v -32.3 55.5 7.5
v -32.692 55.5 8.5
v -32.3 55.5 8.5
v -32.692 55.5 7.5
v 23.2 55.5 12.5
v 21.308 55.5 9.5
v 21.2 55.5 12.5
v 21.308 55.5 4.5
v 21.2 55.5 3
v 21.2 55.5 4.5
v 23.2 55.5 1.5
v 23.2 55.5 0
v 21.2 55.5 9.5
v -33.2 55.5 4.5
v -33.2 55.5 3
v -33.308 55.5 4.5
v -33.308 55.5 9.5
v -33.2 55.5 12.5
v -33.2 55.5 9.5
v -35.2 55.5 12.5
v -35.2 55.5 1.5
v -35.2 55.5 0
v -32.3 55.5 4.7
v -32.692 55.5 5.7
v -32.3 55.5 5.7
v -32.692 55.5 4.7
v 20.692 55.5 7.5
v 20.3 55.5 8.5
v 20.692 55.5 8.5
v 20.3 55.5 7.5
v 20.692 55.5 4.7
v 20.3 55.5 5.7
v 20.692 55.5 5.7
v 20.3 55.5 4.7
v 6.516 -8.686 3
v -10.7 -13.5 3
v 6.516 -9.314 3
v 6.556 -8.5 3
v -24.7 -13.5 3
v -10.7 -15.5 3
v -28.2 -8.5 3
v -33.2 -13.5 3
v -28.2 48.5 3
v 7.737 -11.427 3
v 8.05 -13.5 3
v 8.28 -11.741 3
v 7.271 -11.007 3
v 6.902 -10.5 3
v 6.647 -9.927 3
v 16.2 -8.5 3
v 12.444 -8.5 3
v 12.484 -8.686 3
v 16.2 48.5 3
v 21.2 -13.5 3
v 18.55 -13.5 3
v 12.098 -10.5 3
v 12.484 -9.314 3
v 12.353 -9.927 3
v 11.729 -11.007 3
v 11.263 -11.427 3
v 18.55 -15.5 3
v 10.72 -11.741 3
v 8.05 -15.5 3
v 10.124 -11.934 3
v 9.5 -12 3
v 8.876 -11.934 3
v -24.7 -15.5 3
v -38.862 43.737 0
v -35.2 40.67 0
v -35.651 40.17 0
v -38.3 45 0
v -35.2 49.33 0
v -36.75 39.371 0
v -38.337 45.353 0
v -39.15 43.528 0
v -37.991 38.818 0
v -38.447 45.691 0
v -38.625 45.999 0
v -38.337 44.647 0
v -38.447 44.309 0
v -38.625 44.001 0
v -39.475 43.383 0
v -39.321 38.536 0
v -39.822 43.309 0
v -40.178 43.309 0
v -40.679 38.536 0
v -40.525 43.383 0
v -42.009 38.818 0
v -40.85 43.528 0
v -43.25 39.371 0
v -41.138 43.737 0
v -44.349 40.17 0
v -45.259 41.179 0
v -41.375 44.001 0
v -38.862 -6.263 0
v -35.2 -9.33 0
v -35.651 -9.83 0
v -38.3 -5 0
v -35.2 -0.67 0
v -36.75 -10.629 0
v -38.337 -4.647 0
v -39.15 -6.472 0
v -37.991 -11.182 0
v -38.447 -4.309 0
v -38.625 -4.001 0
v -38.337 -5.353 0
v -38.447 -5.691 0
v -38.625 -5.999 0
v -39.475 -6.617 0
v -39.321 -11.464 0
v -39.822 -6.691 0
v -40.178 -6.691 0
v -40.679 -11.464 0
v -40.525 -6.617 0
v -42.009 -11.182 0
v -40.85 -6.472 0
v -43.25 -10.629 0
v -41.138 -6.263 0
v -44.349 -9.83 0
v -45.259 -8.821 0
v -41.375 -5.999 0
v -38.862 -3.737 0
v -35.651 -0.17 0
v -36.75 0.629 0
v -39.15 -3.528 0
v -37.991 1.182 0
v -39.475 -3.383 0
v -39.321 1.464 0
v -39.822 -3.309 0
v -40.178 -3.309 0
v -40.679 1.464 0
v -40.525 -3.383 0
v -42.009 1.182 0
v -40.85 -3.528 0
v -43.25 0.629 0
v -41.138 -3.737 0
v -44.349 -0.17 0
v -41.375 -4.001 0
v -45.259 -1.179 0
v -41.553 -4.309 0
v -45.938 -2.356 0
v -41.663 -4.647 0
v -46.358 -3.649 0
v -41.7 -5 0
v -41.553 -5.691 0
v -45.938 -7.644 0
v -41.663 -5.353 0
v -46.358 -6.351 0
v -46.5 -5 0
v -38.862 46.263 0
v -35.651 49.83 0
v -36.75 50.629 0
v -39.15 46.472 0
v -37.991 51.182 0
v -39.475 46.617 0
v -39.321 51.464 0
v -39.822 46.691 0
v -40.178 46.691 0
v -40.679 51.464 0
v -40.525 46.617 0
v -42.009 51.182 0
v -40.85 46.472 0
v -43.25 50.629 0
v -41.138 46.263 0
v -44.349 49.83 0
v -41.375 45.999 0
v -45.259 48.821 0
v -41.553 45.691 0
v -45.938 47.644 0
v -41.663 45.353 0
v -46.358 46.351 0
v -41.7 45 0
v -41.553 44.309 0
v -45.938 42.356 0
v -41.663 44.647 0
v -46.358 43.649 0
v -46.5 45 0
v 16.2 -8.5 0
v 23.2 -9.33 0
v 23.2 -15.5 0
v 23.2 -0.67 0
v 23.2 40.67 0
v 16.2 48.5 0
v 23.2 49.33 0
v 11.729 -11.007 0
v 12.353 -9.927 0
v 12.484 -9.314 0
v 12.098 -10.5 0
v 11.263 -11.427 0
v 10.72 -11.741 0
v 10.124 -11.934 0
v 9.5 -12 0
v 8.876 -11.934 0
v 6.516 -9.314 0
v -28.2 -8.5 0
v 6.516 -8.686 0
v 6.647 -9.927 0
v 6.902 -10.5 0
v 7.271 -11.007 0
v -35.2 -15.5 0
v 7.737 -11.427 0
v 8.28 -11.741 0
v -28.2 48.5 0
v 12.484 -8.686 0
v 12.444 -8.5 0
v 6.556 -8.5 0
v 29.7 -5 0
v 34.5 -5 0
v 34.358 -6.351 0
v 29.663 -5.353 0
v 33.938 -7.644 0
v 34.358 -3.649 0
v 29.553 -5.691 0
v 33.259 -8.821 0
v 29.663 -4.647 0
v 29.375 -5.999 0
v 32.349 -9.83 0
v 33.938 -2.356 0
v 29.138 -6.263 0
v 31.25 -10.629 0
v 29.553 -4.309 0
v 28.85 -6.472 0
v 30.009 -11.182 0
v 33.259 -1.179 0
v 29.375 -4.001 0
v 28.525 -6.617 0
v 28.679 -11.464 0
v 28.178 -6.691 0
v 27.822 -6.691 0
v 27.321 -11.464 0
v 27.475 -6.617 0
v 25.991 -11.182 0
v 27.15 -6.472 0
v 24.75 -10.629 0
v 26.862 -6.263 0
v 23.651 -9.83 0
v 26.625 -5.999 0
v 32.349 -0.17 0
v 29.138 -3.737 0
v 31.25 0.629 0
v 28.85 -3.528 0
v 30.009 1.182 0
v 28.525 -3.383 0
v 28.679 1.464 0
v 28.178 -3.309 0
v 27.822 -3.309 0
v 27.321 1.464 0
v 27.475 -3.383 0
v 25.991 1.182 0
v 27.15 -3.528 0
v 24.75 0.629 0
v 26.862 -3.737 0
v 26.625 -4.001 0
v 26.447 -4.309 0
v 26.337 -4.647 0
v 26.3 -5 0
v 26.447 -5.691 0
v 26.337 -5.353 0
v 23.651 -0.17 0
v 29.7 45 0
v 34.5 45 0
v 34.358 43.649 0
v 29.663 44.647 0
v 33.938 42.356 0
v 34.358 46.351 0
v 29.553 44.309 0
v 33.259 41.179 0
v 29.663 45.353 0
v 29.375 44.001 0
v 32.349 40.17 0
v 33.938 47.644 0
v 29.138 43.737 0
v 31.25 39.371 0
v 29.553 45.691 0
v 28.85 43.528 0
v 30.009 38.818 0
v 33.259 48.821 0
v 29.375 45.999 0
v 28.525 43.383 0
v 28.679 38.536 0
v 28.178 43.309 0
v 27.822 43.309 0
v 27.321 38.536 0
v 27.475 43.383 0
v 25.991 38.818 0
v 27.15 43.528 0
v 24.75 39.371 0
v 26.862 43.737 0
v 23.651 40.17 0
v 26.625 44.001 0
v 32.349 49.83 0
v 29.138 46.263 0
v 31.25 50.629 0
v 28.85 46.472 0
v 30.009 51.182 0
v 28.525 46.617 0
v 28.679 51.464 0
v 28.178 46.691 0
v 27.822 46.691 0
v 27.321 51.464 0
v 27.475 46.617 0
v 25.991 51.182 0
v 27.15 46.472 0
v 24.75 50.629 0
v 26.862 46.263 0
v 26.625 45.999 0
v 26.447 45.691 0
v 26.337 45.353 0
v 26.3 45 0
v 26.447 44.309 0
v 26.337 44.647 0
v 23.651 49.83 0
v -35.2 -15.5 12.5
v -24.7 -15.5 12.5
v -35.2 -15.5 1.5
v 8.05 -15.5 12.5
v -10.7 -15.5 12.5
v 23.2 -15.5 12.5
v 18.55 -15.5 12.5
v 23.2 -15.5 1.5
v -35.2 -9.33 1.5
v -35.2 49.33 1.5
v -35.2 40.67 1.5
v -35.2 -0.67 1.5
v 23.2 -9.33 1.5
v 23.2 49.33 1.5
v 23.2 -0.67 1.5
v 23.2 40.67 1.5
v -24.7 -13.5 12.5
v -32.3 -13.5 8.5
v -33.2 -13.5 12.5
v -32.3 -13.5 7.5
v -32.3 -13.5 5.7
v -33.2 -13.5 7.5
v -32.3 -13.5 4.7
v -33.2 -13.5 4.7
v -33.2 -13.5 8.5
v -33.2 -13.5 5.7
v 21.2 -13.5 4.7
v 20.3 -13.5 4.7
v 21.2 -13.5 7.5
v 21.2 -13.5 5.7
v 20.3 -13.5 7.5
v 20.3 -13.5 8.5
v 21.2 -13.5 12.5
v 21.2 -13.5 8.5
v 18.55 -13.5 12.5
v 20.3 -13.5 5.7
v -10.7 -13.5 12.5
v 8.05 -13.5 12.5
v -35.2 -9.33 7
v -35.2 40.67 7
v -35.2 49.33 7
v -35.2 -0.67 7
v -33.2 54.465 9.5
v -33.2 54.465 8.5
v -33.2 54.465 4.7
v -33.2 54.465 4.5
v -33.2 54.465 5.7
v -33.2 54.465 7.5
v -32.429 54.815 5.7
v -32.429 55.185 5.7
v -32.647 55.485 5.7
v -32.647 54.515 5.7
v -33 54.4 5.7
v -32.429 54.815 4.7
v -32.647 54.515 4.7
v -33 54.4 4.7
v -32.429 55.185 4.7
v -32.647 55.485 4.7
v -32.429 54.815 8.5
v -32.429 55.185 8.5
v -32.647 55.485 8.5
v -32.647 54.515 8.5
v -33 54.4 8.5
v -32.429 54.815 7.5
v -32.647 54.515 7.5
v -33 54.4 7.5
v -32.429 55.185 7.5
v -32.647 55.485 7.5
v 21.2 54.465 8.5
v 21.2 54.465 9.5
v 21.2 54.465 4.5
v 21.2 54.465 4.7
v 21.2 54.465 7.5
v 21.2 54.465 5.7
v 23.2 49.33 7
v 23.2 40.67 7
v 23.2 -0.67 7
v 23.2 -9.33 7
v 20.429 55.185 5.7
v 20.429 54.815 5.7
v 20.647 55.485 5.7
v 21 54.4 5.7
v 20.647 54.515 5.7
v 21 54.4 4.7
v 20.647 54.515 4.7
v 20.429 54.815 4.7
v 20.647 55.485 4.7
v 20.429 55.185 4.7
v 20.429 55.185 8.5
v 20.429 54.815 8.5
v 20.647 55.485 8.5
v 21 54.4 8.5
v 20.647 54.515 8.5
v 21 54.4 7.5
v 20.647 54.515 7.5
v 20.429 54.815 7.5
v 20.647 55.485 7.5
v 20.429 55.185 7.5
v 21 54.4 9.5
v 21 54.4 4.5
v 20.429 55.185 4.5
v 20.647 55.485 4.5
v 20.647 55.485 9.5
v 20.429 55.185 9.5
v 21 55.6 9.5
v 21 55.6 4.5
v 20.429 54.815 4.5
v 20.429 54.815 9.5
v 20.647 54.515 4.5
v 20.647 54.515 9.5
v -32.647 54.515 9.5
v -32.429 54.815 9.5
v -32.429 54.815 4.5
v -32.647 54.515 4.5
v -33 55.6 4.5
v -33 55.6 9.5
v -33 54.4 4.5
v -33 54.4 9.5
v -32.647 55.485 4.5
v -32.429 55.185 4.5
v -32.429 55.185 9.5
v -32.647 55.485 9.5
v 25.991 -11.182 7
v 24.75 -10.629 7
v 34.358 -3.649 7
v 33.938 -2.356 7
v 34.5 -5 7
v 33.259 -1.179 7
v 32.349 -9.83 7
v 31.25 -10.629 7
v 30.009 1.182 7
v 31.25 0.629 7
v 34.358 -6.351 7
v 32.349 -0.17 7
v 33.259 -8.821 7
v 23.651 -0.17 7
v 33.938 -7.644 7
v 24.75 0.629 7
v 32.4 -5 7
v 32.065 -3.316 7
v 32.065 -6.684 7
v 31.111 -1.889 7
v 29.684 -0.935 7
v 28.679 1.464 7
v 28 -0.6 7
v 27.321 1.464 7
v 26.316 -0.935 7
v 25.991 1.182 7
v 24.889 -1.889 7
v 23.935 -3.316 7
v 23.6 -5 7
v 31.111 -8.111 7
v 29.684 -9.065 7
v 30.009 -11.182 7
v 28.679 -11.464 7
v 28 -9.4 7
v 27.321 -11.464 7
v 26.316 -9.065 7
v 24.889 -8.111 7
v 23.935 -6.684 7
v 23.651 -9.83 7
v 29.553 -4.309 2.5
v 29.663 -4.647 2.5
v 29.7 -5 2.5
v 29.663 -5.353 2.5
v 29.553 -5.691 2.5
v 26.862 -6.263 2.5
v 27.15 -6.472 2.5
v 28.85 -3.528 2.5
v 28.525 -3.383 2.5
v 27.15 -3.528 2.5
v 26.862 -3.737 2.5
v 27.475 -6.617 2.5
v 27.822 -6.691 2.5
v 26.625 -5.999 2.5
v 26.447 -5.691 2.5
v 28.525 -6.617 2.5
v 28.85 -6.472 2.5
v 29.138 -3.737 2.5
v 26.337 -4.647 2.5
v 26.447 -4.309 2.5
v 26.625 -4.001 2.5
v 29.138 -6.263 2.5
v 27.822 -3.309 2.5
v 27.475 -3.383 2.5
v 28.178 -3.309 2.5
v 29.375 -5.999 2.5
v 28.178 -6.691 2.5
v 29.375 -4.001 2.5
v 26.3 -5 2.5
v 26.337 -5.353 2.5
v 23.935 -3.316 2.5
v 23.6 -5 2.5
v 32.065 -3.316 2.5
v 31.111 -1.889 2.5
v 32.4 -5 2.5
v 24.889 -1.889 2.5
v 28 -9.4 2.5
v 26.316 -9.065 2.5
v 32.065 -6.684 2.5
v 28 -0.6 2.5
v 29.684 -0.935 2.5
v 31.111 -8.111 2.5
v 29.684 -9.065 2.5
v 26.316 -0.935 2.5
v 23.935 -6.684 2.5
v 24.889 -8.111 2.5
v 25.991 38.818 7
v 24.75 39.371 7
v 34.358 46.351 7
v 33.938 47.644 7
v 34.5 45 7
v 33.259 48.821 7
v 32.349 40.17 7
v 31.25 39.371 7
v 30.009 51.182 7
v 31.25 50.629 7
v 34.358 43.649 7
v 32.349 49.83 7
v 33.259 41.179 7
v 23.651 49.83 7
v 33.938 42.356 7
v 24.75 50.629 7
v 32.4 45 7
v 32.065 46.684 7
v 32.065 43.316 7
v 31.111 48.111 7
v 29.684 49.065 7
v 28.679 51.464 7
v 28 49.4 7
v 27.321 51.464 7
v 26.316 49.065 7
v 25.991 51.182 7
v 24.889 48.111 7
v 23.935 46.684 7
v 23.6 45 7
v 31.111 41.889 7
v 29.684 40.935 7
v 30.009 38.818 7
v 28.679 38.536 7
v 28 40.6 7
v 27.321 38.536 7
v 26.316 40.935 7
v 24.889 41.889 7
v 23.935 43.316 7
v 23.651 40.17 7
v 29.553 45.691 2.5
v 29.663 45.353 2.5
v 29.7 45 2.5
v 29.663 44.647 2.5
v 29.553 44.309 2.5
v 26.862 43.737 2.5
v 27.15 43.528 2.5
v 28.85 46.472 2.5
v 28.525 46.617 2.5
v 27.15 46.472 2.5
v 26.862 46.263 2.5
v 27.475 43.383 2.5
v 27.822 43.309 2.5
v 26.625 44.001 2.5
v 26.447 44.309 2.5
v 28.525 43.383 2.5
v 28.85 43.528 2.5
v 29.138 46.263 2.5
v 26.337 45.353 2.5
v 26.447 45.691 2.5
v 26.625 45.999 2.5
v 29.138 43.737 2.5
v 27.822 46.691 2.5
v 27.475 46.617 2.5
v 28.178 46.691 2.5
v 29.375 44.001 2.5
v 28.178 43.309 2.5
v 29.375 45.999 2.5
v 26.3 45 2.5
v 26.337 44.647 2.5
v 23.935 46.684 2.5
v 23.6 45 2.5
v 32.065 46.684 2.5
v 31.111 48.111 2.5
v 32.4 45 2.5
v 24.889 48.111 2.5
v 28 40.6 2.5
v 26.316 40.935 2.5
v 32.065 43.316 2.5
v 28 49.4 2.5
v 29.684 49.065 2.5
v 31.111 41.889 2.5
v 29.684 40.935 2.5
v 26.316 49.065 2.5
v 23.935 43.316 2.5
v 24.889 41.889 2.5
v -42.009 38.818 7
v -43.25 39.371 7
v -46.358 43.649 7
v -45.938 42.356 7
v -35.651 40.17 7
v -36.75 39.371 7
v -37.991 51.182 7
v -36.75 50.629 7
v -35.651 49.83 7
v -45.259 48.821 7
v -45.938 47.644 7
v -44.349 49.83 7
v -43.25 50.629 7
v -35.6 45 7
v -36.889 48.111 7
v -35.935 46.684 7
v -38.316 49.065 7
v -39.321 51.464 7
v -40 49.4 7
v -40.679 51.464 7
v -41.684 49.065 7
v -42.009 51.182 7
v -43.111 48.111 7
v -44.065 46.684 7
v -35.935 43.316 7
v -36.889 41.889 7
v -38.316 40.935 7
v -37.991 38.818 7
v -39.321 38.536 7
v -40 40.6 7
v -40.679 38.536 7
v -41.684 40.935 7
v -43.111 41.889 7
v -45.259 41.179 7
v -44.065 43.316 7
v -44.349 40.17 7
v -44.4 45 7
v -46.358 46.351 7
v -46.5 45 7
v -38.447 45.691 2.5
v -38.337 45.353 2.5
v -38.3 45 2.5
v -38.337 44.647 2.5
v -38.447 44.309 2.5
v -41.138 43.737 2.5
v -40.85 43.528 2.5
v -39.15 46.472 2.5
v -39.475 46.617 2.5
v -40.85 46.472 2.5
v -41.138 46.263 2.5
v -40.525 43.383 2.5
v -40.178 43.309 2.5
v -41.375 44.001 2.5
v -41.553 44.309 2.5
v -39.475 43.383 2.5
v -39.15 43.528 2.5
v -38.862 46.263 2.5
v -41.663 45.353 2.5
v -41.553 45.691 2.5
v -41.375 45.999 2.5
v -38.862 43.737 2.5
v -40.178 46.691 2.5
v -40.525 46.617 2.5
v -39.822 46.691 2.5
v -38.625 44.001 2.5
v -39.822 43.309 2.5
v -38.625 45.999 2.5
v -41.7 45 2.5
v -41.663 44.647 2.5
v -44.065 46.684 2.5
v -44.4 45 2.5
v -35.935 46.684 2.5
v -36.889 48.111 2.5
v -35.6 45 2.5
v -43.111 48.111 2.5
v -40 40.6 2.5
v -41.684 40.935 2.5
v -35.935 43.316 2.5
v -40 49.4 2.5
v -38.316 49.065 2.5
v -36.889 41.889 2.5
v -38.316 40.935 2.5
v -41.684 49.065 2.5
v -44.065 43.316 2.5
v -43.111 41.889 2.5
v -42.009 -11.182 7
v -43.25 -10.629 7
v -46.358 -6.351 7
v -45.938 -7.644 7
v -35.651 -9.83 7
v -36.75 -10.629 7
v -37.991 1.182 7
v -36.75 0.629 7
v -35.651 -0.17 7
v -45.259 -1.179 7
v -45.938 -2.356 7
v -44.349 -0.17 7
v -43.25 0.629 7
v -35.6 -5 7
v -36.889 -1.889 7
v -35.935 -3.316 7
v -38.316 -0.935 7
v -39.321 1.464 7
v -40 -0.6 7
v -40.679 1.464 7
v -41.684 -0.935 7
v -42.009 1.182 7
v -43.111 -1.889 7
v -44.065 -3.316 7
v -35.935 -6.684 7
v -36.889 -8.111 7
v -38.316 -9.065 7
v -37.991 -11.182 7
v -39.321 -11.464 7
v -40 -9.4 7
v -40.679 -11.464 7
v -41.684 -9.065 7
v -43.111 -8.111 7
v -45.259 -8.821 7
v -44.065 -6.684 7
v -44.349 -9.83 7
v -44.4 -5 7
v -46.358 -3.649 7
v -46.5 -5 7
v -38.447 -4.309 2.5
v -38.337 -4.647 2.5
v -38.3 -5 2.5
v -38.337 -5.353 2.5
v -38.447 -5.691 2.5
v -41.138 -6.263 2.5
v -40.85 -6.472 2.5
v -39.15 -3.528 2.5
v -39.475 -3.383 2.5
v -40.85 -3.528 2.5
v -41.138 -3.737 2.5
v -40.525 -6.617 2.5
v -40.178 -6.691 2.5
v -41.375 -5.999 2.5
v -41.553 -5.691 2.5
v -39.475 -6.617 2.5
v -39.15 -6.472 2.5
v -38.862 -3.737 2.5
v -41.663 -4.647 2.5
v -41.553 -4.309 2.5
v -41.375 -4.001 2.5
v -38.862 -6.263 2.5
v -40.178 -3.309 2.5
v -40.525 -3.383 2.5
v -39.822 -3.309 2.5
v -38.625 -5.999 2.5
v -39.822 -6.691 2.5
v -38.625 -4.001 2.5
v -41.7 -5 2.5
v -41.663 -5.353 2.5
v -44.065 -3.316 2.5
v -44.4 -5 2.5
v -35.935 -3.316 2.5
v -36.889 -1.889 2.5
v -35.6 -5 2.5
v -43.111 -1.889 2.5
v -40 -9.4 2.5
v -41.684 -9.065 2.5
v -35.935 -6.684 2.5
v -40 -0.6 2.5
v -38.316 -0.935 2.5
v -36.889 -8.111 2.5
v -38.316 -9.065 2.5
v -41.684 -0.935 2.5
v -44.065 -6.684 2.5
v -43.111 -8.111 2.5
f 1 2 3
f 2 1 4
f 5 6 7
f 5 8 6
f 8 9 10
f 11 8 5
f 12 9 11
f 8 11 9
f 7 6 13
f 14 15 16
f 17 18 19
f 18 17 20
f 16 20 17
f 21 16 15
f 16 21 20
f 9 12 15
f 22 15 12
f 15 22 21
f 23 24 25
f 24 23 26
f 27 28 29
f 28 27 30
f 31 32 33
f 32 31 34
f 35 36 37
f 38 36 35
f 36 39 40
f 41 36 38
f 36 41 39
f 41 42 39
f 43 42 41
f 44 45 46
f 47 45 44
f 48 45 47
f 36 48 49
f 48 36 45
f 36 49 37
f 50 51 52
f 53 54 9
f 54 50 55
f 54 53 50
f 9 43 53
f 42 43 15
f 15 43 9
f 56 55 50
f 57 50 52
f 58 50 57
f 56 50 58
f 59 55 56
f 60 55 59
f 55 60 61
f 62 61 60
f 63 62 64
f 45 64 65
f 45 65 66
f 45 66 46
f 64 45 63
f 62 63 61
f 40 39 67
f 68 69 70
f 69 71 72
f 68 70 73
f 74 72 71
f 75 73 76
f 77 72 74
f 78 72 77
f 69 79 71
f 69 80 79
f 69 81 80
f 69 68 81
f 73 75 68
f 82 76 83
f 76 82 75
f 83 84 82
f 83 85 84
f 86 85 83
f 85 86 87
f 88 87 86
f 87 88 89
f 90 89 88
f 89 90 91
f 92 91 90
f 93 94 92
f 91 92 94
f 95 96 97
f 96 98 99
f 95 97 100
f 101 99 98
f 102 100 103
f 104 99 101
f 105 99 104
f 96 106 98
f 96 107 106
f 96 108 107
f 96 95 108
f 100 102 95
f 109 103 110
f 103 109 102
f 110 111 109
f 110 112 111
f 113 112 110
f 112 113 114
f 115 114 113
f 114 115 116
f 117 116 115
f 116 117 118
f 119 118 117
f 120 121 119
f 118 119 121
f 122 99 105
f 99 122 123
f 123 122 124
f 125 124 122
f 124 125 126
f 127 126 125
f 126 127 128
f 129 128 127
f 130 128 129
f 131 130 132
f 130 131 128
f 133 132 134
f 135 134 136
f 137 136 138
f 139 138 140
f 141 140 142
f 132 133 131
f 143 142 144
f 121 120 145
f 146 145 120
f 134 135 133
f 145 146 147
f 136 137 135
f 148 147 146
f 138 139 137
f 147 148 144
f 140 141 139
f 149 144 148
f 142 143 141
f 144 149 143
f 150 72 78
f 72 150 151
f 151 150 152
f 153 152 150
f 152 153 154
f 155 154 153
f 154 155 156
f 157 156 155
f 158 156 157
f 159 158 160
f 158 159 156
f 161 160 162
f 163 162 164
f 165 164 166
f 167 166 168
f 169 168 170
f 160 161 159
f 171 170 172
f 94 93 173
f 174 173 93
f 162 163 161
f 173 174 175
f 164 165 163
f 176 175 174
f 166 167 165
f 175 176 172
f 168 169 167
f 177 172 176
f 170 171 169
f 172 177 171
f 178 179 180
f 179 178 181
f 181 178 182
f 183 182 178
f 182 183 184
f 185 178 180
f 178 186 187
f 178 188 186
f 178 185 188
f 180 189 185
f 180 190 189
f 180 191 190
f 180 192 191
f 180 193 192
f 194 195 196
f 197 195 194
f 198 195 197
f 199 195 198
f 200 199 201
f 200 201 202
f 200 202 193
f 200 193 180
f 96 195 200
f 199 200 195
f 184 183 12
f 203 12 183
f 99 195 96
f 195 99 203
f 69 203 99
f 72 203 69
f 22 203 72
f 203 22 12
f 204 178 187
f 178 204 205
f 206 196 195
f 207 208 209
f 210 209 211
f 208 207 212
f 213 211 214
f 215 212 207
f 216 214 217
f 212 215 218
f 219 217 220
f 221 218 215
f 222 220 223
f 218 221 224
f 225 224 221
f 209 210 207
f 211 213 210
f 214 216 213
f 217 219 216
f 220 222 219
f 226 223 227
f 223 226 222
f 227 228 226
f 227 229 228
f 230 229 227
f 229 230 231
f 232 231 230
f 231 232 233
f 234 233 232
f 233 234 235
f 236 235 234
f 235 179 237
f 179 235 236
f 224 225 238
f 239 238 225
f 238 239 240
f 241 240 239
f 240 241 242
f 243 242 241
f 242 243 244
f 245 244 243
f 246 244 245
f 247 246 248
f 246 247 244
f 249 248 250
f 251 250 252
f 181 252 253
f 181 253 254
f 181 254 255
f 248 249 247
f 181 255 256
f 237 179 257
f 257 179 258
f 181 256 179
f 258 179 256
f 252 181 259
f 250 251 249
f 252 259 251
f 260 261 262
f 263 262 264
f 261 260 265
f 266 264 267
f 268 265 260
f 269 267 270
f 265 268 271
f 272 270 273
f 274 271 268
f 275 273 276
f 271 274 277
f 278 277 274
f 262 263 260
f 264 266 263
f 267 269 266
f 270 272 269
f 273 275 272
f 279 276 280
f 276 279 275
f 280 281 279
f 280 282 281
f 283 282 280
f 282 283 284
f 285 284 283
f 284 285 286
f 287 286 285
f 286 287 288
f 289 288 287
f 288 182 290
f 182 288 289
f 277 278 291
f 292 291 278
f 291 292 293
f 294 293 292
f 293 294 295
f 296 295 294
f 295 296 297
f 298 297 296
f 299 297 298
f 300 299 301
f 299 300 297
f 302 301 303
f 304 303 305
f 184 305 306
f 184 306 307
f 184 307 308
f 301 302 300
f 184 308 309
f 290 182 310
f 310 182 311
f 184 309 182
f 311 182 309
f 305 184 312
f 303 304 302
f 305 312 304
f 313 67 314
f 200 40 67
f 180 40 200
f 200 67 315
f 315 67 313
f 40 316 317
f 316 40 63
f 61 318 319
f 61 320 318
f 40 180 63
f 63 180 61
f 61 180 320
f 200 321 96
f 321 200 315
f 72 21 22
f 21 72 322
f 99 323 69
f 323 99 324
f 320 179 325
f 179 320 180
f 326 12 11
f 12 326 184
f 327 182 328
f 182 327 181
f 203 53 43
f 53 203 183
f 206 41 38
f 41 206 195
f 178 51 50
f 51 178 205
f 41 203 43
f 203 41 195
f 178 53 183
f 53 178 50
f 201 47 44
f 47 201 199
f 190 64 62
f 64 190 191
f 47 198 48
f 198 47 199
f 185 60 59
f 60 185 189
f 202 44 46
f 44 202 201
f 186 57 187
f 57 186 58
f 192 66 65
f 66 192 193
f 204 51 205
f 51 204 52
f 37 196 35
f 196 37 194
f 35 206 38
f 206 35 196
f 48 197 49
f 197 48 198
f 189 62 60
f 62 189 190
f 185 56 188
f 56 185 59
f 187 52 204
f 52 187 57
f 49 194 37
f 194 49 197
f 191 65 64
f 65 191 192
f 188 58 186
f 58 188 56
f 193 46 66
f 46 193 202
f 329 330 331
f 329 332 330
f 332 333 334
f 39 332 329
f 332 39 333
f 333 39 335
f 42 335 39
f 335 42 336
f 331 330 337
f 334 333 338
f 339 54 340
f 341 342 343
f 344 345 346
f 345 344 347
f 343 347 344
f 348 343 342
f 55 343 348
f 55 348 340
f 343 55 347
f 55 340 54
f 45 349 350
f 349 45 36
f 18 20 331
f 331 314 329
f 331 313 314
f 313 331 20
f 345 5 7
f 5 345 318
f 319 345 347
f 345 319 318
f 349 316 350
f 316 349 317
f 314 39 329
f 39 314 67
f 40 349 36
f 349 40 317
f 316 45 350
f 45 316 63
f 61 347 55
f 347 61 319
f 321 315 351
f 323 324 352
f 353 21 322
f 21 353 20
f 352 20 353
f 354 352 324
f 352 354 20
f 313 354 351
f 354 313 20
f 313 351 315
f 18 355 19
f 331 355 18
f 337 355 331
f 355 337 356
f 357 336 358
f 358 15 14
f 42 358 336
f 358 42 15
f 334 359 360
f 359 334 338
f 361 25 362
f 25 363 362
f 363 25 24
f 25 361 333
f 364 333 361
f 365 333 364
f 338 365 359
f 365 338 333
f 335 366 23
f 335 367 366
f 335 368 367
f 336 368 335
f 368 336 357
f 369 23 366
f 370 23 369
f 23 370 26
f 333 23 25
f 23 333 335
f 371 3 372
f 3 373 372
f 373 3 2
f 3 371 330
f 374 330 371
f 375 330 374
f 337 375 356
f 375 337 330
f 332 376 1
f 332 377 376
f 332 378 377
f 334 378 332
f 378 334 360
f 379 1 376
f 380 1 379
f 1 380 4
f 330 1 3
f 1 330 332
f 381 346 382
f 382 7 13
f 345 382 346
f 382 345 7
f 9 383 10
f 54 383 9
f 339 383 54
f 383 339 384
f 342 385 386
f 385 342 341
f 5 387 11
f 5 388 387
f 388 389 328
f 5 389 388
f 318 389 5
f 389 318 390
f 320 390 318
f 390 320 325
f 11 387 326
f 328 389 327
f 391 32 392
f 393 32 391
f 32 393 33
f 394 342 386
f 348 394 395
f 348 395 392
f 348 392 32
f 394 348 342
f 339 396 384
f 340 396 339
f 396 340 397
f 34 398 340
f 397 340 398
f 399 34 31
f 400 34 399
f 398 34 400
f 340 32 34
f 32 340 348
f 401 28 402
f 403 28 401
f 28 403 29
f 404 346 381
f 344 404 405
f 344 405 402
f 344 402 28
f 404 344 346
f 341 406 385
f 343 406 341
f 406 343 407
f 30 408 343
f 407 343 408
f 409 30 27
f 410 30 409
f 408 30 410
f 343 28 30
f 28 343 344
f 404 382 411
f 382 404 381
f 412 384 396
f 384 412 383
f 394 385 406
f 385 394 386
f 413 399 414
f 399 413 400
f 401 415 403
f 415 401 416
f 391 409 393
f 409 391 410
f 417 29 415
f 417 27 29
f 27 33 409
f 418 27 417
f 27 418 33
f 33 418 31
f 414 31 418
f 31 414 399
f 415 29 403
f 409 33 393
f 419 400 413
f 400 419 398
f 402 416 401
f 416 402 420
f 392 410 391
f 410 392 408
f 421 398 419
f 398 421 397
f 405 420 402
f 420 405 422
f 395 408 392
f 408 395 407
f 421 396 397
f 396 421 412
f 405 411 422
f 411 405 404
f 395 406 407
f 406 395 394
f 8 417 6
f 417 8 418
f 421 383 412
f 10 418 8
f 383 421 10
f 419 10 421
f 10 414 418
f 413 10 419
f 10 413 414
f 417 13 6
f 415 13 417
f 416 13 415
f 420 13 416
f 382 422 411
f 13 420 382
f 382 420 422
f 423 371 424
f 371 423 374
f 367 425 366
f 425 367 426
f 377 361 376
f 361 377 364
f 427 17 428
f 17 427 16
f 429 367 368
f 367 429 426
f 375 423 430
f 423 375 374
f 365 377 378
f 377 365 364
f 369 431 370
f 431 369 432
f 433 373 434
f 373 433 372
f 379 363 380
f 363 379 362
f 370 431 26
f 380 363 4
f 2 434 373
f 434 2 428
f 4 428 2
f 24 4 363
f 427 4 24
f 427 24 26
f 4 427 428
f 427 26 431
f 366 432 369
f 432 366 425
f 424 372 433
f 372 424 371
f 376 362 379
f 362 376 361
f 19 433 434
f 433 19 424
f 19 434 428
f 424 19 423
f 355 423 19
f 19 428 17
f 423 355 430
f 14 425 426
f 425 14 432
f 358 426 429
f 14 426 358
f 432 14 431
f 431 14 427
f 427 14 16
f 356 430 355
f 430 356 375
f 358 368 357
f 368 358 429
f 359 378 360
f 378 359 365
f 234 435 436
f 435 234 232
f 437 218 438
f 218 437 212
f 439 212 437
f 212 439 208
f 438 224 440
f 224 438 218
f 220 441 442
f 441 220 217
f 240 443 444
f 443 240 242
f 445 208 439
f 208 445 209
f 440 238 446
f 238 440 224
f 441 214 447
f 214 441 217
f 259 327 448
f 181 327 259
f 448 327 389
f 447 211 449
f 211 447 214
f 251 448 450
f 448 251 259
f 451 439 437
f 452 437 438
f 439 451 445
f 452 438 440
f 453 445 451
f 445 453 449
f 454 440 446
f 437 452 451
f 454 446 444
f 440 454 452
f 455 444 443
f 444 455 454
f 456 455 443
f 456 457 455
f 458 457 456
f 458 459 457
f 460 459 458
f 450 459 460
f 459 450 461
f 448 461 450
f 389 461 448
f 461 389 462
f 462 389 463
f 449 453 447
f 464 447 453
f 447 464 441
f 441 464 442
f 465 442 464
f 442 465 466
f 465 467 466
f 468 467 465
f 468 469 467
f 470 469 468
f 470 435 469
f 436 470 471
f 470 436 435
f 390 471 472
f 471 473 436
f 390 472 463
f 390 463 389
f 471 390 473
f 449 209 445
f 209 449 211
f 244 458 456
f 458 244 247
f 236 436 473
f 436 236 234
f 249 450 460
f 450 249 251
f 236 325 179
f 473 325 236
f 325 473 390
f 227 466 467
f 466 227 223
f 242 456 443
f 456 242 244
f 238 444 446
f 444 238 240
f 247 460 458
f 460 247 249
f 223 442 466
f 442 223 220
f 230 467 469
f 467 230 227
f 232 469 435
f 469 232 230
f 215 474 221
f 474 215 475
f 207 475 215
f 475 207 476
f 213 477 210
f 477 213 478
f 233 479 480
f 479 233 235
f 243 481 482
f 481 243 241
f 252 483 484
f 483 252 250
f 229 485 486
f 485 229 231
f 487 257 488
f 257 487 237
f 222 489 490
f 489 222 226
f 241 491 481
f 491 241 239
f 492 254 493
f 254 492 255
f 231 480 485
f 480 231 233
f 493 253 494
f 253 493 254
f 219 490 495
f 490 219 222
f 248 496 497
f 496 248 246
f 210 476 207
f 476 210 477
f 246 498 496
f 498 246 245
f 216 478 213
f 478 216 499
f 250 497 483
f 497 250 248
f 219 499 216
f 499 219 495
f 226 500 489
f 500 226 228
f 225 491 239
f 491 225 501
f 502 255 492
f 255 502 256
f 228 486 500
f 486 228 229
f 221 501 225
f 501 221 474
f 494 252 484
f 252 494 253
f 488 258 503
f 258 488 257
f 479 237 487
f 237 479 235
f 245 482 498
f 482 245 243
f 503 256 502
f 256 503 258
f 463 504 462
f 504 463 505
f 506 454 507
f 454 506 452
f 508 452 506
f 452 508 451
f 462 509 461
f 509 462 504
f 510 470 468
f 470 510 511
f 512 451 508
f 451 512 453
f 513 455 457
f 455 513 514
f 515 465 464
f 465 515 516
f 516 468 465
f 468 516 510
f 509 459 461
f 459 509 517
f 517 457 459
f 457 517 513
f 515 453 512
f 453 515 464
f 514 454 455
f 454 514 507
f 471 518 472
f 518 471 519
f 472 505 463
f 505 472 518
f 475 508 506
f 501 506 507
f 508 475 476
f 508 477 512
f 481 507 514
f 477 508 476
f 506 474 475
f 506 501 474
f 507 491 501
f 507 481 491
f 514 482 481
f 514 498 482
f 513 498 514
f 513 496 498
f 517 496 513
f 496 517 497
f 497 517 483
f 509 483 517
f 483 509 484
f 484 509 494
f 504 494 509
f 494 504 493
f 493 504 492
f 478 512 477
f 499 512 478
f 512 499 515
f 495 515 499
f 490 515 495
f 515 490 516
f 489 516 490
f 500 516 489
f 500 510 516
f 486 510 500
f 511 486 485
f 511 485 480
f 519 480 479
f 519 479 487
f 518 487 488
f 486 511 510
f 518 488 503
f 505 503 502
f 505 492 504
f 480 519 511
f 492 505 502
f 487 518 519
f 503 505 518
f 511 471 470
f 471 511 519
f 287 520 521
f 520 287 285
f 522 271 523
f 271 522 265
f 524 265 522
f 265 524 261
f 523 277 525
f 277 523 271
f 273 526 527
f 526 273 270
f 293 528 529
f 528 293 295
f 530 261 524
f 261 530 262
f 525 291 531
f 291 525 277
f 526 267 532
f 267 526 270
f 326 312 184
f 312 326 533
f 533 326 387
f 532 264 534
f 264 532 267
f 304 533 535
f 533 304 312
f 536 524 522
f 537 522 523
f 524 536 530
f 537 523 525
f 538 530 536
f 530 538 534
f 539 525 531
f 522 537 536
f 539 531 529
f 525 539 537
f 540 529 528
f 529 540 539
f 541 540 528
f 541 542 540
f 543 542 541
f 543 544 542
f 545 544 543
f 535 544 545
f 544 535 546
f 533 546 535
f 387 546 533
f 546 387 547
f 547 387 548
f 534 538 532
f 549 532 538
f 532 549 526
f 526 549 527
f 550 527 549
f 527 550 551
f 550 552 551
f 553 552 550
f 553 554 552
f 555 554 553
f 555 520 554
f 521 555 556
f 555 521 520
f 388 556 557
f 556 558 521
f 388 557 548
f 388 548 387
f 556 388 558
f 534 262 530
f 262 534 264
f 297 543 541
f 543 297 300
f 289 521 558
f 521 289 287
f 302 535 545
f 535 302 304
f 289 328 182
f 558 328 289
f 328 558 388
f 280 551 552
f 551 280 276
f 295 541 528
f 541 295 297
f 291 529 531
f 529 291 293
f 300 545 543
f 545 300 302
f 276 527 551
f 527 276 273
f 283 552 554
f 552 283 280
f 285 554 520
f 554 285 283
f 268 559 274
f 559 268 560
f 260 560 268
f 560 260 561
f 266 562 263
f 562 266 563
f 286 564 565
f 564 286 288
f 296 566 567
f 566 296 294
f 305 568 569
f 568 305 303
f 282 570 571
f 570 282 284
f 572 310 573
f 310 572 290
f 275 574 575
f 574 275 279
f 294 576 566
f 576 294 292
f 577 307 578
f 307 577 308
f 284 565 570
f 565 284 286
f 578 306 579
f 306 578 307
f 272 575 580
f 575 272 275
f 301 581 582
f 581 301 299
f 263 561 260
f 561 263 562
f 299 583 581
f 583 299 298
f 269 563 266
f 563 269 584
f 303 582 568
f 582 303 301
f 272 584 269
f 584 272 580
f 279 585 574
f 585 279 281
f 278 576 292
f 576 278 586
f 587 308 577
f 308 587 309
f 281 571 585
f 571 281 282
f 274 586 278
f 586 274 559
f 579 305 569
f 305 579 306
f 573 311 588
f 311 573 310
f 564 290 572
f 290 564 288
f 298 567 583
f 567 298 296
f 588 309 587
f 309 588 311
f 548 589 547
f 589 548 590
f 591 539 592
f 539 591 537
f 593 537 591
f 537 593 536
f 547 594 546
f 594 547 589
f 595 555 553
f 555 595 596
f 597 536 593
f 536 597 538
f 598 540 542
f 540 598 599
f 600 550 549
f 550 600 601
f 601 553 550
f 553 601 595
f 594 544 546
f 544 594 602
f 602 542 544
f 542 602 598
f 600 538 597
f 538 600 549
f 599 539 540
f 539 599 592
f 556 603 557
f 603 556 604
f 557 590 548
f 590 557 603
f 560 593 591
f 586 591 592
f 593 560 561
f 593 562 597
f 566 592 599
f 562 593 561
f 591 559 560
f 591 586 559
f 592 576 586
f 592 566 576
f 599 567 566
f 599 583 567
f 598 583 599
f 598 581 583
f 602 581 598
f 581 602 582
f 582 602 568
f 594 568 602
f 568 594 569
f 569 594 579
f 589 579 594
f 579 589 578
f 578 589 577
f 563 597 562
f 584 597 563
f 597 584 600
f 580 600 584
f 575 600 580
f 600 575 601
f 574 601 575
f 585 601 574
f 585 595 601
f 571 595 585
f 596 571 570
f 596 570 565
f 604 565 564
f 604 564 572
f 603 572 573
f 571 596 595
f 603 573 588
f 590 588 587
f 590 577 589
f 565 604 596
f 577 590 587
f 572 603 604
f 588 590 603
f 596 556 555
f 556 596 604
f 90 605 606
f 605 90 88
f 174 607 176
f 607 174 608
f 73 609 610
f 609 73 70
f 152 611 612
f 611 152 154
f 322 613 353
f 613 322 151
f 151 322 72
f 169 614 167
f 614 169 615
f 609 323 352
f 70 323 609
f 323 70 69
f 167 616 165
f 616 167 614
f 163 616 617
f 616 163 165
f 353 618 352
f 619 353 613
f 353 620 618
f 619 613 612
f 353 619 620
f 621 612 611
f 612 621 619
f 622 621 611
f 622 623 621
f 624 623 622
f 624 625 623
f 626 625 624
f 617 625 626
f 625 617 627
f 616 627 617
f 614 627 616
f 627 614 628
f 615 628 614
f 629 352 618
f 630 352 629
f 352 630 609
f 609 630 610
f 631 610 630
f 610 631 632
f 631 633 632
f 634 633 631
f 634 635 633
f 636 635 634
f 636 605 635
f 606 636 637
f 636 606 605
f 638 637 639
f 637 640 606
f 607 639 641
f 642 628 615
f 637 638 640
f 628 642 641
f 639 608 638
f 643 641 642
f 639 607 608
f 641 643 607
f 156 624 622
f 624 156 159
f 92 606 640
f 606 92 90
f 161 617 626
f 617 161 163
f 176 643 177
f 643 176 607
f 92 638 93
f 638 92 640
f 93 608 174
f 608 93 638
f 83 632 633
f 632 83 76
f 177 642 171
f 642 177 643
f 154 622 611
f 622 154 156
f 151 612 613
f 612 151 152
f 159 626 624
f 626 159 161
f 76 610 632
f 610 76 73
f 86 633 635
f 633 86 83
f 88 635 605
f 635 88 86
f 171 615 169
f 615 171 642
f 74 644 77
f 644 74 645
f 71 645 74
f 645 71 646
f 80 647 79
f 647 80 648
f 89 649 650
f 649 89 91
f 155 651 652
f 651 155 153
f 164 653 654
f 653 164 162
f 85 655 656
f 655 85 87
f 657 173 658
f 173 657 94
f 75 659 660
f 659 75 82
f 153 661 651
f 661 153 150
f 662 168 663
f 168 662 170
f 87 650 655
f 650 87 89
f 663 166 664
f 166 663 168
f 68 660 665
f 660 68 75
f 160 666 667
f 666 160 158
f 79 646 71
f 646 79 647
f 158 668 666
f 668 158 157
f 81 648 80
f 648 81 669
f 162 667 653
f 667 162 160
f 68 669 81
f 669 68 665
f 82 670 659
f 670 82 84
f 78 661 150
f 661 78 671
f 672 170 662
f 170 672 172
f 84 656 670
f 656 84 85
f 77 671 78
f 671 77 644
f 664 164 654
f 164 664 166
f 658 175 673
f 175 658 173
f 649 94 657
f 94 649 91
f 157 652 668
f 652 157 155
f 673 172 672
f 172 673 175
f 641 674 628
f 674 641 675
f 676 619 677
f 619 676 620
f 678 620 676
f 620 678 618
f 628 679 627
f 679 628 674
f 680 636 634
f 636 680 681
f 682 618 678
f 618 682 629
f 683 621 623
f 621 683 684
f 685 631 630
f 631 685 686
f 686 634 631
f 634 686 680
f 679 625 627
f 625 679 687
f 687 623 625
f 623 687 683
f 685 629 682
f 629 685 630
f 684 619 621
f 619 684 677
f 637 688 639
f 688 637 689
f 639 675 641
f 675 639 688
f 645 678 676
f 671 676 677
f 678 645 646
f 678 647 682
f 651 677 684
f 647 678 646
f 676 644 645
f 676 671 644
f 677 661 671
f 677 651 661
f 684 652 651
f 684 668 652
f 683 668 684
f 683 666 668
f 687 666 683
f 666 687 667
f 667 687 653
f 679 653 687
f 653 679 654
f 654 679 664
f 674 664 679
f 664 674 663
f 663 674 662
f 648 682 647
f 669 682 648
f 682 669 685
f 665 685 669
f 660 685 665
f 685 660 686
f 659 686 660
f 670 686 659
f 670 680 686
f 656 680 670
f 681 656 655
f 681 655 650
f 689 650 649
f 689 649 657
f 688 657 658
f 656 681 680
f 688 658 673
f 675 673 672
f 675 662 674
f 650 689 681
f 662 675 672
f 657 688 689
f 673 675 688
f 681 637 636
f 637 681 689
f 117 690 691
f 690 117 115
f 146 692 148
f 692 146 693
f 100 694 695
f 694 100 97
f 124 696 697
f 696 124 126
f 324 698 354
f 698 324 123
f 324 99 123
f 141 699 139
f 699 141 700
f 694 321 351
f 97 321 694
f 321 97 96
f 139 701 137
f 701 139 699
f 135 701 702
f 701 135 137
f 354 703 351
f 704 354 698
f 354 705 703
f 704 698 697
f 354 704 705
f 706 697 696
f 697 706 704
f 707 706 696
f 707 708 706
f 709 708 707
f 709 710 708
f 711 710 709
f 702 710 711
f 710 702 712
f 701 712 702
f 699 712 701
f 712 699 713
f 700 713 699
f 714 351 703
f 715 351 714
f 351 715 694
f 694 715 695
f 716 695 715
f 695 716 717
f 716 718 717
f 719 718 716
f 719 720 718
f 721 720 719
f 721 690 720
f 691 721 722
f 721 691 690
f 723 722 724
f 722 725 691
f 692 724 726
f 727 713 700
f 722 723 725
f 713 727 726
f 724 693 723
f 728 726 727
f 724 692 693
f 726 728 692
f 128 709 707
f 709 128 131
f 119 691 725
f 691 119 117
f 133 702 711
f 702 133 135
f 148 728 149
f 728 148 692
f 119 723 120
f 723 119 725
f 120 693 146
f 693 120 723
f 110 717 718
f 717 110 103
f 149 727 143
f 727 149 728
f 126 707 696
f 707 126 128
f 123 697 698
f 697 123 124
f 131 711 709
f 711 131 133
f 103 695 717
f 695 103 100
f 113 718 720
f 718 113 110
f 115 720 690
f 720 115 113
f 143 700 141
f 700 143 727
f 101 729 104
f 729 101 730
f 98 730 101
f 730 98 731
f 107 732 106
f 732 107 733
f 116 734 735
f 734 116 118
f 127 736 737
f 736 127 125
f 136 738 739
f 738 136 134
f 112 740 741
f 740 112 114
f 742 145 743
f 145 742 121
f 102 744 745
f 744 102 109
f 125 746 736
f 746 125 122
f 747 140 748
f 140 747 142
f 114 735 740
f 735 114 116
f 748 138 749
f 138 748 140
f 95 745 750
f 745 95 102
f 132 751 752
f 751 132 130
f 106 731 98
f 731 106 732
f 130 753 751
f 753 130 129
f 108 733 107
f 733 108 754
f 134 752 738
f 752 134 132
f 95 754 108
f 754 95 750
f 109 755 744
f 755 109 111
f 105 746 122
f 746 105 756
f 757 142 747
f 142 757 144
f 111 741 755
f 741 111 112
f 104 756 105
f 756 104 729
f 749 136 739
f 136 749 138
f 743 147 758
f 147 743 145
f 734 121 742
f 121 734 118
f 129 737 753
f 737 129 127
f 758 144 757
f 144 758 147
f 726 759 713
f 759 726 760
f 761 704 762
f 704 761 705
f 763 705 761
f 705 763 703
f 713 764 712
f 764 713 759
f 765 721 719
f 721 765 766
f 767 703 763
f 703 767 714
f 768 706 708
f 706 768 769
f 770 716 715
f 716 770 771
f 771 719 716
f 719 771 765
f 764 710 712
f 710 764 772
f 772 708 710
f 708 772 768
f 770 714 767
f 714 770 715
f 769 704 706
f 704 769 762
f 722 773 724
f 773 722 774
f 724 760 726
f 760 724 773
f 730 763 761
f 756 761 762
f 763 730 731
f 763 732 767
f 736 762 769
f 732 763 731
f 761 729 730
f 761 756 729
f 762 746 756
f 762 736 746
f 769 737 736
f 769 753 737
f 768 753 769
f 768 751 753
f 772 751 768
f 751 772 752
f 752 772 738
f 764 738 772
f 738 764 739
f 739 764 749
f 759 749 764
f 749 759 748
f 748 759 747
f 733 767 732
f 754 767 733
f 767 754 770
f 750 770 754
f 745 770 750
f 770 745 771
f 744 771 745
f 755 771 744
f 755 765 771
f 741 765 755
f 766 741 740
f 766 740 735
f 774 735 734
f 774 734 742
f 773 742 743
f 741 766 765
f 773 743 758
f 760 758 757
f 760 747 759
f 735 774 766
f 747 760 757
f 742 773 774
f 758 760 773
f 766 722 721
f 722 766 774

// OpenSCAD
//-- This is a holder for the Arduino
//-- Uno + CNC Shield V3 + A4988 + 60mm fan stack,
//-- where the boards slide in USB interface first.
//-- Based on my earlier similar design for the P3Steel.

//-- by AndrewBCN - Barcelona, Spain - May 2015
//-- License is GPL V3

//-- Inspired by two Thingiverse objects: #8706 and #443013

//-- This is a new version specifically designed to use
//-- self-tapping wood screws to screw the holder to a
//-- wooden base.

//-- Parameters

//-- Arduino Uno dimensions
ard_l = 69;
ard_w = 53.5;

usb_w = 13.5;  // USB cutout width
power_w = 10;  // Arduino power connector cutout width

//-- Base dimensions
wall_th = 2; // wall thickness
side_wall_height = 7;
bottom_wall_height = 11;

base_l = ard_l + wall_th;
base_w = ard_w + wall_th + wall_th + 0.9; // 1mm margin to allow the arduino to slide in
base_h = wall_th + 1; // make it slightly thicker than walls

bottom_rail_height = -1.8; // I confess I eyeballed this value

//-- frame attachments dimensions
holder_corner_radius = 6.5;
holder_corner_height = 7;

nut_well_diameter = 8.8;
nut_well_depth = 5;
screw_diam = 3.4; // M3 nuts and bolts are used throughout

//-- P3Steel dimensions as measured
x1 = 68; // horizontal distance between bottom holes
x2 = 68; // horizontal distance between top holes
x_offset = 0; // approximate horizontal offset between top and bottom holes centerlines

y1 = 50; // vertical distance between holes


module base() {
//-- Build base, bottom wall, side wall, rails
//-- all are cubes
//-- note base is hollowed out using another cube

  rotate([0,0,90])
  translate([20,4,base_h/2]) {
    difference() {
      cube([base_l, base_w, base_h], center=true);
      cube([base_l-2*side_wall_height, base_w-2*side_wall_height, 3*base_h], center=true);
      translate([-29,-15.5,0])
	cylinder(r=3, h=3*base_h,$fn=30,center=true); // small prong cutout
    }
    translate([wall_th/2-base_l/2,0,bottom_wall_height/2])
      difference() {
	cube([wall_th, base_w, bottom_wall_height], center=true); // bottom wall
	translate([0,11.7,0])
	  cube([2*wall_th, usb_w+0.5, bottom_wall_height+2], center=true); // USB cutout
	translate([0,-19.3,0])
	  cube([2*wall_th, power_w+0.5, bottom_wall_height+2], center=true); // Arduino power connector cutout
      }
    translate([0,-wall_th/2+base_w/2,bottom_wall_height/2]) {
      cube([base_l, wall_th, bottom_wall_height], center=true); // side wall left
      translate([0,-wall_th/2,bottom_rail_height])
	cube([base_l, 1.8, 1], center=true); // bottom rail
      translate([0,-wall_th/2,bottom_rail_height+2.8]) // 2.8 = pcb thickness + rail thickness + some margin
	cube([base_l, 1.8, 1], center=true); // top rail
      }
    translate([0,wall_th/2-base_w/2,bottom_wall_height/2]) {
      cube([base_l, wall_th, bottom_wall_height], center=true); // side wall right
      translate([0,wall_th/2,bottom_rail_height])
	cube([base_l, 1.8, 1], center=true); // bottom rail
      translate([0,wall_th/2,bottom_rail_height+2.8]) // 2.8 = pcb thickness + rail thickness + some margin
	cube([base_l, 1.8, 1], center=true); // top rail
      }
    // small bumps to prevent the arduino sliding out of the holder
    translate([35,-27,3]) cylinder(r=0.6,h=5,$fn=10);
    translate([35,27,3]) cylinder(r=0.6,h=5,$fn=10);
  }
}

module stands() {
  difference() {
    cylinder(r=holder_corner_radius,h=holder_corner_height,$fn=30,center=true); // cylinder
    cylinder(r=screw_diam/2,h=2*holder_corner_height,$fn=30,center=true); // M3 screw hole
    translate([0,0,holder_corner_height-nut_well_depth])
      cylinder(r=nut_well_diameter/2,h=nut_well_depth+1,$fn=16,center=true); // M3 nut well
  }
}

module attachments() {
//-- OK, now we define the small stands that are going to be attaching
//-- our holder to the steel frame. These have to be positioned
//-- so they match the already laser-drilled holes in the frame.

//-- The centers of the four corner cylinders
//-- These are measured on the P3Steel frame on the left side
//-- P1, P4 : bottom holes
//-- P3, P4 : left holes

  P1=[x1/2,-y1/2,0];
  P2=[x2/2+x_offset,y1/2,0];
  P3=[-x2/2+x_offset,+y1/2,0];
  P4=[-x1/2,-y1/2,0];

  translate([-6,20,holder_corner_height/2]) {
      translate(P1)
	stands();
      translate(P2)
	stands();
      translate(P3)
	stands();
      translate(P4)
	stands();
  }
}

//-- a few cylinders conveniently placed and hulls to join them
//-- like, totally eyeballed...
module hull_shaper() {
 cylinder(r=1,h=base_h,$fn=10,center=true); // flat small cylinder
}

module arms() {
  // stand 1 right top
  #hull() {
  translate([20,-8,base_h/2]) hull_shaper();
  translate([40.7,-3,base_h/2]) hull_shaper();
  translate([40.7,4,base_h/2]) hull_shaper();
  translate([20,7,base_h/2]) hull_shaper();  
  }

  // stand 2 right bottom
  #hull() {
  translate([22,-22,base_h/2]) hull_shaper();
  translate([37.5,-42.5,base_h/2]) hull_shaper();
  translate([33.5,-48,base_h/2]) hull_shaper();
  translate([15,-30,base_h/2]) hull_shaper();  
  }

  // stand 3 left top
  #hull() {
  translate([-32,10,base_h/2]) hull_shaper();
  translate([-37,4,base_h/2]) hull_shaper();
  translate([-37,-3,base_h/2]) hull_shaper();
  translate([-32,-7,base_h/2]) hull_shaper();  
  }

  // stand 4 left bottom
  #hull() {
  translate([-34,-31,base_h/2]) hull_shaper();
  translate([-22,-30,base_h/2]) hull_shaper();
  translate([-38,-43,base_h/2]) hull_shaper();
  translate([-34,-46,base_h/2]) hull_shaper();  
  }
}

//-- Print the part
translate ([-2,0,0]) base();
attachments();
//arms(); // not used in this version

// these are used to check that the cutouts are correct
//translate([-33.5,-16,12]) color("blue") cube([9,1,2]);
//translate([18.5,-16,12]) color("blue") cube([3,1,2]);
//translate([-11,-16,12]) color("blue") cube([19,1,2]);
